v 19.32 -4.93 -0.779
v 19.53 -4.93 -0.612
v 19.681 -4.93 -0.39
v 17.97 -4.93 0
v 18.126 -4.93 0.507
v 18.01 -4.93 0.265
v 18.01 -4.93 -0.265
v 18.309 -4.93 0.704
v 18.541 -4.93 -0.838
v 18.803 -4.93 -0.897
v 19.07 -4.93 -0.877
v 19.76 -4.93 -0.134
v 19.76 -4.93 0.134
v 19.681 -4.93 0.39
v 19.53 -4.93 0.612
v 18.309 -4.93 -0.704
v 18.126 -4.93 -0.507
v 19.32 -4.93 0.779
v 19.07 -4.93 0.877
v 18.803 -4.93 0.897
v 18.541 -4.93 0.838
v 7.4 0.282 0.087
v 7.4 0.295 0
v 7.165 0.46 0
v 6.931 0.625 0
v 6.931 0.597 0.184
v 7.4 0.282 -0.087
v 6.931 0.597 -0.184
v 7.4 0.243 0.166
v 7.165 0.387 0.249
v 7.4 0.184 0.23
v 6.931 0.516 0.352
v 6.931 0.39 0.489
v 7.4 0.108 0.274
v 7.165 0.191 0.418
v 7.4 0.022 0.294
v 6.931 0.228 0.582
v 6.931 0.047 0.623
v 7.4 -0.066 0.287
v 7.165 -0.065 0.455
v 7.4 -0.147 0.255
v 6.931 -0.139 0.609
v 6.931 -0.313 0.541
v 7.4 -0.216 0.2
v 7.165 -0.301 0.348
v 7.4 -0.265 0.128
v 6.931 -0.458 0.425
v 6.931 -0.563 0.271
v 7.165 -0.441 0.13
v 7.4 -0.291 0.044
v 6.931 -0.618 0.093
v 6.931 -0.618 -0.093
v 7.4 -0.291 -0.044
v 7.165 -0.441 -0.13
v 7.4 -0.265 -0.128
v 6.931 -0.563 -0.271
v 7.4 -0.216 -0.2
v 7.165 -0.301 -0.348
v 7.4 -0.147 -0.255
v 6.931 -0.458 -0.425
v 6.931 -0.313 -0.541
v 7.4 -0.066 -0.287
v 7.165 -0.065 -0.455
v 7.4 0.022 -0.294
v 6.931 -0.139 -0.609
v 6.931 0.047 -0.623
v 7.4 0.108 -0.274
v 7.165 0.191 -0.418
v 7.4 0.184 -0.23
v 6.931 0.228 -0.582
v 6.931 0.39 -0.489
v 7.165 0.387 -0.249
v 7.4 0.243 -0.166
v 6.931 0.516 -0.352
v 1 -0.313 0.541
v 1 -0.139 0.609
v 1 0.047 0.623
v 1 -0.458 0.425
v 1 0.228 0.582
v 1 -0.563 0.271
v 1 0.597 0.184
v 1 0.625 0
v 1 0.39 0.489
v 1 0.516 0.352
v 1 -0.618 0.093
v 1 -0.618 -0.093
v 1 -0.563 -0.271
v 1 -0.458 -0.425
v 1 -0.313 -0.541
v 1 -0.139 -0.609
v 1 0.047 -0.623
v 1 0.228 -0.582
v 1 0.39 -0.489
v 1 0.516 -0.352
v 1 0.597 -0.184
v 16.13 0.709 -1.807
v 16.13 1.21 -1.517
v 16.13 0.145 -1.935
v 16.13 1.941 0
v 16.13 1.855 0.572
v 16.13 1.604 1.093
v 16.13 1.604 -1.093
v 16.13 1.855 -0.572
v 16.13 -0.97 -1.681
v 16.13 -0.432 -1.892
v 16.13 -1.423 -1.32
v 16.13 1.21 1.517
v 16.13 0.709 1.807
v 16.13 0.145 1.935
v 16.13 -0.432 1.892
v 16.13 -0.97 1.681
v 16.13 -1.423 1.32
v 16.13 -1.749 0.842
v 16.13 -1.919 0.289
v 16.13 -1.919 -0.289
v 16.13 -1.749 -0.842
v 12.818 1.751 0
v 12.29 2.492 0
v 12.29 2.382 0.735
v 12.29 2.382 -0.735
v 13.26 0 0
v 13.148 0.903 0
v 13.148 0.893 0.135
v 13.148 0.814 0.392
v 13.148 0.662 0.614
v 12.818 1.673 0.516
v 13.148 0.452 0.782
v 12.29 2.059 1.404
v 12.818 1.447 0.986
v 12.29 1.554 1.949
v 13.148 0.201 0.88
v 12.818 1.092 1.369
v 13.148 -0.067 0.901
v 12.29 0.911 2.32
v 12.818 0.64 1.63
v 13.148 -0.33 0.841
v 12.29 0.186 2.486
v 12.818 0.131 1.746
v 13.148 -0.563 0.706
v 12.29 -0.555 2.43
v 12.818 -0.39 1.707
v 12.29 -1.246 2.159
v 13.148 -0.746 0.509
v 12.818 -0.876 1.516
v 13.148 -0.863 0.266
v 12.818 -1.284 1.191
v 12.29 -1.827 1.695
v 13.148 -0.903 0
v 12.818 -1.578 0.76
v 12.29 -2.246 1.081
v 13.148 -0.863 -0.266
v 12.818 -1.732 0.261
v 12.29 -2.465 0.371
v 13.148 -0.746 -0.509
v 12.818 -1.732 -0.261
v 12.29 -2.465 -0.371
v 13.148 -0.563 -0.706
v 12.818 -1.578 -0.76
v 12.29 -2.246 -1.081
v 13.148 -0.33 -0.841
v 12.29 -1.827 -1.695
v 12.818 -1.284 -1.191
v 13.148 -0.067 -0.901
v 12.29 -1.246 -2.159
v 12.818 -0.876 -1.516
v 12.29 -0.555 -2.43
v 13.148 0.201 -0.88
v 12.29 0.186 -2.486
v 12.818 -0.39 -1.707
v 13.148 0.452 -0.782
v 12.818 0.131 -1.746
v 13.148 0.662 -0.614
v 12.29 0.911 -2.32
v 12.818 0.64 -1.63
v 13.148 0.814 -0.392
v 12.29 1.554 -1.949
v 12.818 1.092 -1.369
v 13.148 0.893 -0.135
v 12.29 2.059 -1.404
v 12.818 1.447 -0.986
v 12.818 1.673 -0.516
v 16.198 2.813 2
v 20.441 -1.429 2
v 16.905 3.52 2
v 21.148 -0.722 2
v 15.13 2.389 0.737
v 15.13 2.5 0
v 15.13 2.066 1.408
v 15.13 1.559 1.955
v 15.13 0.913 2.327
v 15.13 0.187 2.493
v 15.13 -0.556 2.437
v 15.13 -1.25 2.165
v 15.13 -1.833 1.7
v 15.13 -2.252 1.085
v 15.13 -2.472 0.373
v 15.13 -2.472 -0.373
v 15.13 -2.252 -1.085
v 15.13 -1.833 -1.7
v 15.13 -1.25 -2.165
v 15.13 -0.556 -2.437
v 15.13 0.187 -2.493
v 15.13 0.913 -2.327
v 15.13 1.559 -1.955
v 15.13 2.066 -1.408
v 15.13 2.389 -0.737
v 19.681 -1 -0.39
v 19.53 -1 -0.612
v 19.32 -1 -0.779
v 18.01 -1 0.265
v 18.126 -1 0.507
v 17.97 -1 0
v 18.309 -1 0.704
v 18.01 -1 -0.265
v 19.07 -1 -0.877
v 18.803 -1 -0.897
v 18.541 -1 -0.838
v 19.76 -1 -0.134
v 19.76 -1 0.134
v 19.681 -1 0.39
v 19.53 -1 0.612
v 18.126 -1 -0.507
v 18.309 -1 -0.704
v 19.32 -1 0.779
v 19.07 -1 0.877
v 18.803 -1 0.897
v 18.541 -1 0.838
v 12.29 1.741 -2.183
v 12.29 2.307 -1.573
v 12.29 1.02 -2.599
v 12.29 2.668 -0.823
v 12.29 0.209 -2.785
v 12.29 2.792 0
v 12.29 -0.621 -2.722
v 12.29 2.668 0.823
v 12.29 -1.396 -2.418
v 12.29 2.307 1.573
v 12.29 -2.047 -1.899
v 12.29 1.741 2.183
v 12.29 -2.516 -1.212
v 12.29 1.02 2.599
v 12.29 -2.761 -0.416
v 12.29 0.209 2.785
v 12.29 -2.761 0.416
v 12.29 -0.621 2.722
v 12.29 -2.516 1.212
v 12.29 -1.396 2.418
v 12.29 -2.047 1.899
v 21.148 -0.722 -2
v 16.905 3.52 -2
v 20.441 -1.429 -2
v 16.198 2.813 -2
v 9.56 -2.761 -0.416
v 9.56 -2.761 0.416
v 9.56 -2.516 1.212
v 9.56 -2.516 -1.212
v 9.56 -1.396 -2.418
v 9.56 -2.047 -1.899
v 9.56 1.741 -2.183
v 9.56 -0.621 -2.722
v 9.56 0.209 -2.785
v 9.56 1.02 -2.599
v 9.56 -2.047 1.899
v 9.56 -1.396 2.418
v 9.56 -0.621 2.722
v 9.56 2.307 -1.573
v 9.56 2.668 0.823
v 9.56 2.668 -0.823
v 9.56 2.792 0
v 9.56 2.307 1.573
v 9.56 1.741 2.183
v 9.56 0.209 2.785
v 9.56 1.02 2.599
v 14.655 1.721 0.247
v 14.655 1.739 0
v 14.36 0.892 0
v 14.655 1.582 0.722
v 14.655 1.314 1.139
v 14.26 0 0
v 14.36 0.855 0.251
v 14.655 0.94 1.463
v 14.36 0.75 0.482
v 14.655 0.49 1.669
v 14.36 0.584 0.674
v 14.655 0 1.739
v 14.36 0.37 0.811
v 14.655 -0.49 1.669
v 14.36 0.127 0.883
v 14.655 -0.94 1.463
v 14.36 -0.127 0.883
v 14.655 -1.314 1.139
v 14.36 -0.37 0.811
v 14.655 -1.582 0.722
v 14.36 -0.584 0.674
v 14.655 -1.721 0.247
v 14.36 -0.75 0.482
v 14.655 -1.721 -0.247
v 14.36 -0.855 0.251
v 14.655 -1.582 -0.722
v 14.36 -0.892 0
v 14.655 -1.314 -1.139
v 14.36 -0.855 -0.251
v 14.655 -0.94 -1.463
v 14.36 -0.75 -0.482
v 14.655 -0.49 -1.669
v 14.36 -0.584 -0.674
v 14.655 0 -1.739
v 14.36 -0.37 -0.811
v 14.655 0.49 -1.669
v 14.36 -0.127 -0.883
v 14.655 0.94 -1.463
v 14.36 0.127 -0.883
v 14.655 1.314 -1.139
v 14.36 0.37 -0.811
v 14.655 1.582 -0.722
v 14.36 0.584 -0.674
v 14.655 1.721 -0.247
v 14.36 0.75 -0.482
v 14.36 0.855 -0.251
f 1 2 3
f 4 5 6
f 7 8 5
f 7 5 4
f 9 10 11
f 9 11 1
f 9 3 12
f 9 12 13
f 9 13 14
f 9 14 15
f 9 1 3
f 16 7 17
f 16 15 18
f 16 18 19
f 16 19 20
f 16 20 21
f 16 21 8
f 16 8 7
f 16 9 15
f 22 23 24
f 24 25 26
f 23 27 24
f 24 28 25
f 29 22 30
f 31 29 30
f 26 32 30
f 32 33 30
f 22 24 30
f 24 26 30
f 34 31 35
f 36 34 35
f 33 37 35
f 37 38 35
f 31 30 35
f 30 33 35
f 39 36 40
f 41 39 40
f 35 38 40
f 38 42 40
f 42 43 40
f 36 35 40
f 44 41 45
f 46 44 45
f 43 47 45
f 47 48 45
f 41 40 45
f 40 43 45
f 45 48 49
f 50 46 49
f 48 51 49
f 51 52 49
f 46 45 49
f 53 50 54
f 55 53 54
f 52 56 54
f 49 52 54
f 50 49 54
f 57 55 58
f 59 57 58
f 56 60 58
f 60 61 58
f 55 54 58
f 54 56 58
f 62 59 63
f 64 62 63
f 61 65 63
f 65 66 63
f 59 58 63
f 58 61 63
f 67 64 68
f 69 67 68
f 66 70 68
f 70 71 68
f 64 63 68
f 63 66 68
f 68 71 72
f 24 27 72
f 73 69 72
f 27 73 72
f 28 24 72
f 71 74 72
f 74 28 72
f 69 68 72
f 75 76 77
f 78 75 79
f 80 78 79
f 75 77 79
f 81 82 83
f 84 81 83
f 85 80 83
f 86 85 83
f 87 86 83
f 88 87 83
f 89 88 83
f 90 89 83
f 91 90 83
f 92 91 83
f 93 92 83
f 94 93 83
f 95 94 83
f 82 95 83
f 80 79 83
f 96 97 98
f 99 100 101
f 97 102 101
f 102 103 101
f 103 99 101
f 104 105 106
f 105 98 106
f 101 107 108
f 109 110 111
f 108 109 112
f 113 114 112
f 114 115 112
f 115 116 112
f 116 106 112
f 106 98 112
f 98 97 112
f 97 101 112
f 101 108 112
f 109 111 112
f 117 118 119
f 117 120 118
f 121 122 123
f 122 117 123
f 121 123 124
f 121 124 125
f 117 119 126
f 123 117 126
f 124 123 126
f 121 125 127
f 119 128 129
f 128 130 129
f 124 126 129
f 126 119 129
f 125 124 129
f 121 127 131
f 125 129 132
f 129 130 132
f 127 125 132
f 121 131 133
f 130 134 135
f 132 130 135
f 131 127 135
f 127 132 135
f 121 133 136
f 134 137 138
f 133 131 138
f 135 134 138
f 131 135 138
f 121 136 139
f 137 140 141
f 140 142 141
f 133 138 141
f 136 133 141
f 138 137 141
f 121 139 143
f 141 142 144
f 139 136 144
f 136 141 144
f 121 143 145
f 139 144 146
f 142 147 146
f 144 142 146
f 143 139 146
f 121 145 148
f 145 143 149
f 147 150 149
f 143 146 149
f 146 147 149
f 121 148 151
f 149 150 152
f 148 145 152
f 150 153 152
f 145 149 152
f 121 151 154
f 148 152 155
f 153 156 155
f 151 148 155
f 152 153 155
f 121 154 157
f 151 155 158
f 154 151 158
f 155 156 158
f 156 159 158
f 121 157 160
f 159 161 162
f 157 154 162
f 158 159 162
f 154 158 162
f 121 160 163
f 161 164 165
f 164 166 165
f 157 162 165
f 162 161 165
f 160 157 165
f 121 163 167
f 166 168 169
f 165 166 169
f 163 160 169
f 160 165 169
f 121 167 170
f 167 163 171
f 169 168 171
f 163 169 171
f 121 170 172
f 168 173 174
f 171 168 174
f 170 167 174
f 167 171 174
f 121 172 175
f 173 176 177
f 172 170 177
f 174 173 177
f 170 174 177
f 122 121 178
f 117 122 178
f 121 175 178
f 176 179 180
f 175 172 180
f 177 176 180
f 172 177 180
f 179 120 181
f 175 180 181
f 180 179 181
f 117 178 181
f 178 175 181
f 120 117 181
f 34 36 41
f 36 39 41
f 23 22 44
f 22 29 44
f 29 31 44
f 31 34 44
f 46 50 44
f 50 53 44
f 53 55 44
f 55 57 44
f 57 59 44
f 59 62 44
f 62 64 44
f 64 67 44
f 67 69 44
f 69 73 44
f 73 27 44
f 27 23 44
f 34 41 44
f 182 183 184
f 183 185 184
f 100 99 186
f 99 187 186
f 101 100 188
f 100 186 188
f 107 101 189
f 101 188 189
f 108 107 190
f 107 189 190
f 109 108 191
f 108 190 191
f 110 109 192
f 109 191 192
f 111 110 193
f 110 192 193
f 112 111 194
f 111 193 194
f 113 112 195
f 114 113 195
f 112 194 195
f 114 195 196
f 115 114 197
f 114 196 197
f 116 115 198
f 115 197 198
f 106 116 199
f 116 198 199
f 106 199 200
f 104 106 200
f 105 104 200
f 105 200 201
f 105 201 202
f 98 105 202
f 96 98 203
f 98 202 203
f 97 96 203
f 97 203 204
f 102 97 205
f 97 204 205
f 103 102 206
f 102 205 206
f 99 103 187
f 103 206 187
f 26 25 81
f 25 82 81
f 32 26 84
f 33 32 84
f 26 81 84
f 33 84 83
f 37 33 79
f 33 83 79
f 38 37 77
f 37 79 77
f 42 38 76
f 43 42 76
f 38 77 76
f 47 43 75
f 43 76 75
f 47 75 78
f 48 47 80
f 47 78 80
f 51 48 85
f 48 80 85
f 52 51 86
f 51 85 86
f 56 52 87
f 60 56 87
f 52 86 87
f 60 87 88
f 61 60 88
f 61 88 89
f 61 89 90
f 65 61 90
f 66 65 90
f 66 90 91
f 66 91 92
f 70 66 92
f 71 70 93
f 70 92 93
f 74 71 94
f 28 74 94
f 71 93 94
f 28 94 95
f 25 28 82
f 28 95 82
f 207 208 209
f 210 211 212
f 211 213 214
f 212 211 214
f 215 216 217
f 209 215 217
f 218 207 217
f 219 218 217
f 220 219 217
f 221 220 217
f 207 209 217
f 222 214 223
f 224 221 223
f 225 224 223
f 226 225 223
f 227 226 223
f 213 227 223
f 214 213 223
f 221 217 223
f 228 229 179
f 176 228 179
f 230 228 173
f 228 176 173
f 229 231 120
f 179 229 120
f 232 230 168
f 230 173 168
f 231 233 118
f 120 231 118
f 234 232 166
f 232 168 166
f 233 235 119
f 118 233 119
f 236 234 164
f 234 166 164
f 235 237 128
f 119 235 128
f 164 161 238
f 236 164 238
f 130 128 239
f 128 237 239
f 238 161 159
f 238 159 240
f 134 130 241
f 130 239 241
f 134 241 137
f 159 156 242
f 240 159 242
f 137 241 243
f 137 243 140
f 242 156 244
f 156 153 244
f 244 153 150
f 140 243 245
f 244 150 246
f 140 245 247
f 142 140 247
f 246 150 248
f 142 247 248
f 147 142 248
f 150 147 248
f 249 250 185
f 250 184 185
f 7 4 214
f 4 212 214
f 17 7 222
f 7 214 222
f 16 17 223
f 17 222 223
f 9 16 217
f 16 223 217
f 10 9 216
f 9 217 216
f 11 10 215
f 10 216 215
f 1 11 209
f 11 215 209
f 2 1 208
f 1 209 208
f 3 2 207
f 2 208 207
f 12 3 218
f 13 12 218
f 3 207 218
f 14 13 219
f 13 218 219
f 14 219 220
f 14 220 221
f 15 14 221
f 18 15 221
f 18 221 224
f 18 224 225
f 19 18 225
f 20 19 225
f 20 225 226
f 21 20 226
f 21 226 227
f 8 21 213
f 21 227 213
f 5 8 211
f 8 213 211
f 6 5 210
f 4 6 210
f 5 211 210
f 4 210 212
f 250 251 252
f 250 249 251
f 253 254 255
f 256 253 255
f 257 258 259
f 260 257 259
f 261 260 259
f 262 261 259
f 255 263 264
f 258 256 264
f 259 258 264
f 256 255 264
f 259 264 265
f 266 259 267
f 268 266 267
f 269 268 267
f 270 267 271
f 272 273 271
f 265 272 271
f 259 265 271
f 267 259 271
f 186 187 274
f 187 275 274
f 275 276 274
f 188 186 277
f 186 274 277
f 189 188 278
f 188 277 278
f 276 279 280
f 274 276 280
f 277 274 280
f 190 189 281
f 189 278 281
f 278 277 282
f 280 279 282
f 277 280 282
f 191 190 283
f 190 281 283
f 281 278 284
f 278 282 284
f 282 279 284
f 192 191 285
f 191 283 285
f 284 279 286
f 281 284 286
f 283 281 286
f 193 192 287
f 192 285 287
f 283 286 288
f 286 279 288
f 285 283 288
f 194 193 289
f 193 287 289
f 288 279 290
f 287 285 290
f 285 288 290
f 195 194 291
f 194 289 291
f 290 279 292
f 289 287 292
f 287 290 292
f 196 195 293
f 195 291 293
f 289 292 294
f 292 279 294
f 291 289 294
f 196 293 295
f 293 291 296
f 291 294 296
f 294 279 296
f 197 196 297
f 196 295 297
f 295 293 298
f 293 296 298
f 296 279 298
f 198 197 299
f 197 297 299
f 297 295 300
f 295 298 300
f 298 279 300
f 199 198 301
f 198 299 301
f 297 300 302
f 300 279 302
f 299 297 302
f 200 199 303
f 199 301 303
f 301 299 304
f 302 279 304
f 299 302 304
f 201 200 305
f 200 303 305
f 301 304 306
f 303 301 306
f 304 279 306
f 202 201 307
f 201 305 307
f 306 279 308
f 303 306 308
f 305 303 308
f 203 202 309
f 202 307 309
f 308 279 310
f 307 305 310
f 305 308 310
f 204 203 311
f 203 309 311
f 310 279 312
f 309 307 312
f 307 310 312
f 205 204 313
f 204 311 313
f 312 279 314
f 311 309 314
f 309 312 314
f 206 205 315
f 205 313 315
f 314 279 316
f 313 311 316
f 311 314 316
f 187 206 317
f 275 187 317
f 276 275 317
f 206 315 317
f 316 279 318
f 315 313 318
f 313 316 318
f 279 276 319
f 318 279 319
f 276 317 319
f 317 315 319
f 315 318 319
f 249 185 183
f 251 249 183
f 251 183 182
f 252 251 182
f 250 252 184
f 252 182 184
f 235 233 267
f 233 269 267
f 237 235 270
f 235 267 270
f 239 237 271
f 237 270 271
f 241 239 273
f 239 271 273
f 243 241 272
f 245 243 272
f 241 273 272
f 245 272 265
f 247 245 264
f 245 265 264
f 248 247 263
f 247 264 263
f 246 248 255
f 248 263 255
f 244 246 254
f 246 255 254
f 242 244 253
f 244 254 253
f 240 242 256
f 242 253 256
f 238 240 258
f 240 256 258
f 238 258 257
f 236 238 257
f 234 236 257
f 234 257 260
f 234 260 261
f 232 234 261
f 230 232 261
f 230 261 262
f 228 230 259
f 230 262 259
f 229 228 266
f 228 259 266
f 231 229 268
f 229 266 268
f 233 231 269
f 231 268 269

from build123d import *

# Parameters (mm, degrees)
BOSS_EXTRUDE1_DEPTH = 2
SKETCH1_7_W         = 0.9
SKETCH1_7_H         = 3.93


with BuildPart() as part:
    # Sketch1 → Boss-Extrude1 (new, symmetric)
    with BuildSketch(Plane.XY):
        Polygon((20.440710678, -1.429289322), (16.198069991, 2.813351365), (16.905176772, 3.520458146), (21.147817459, -0.722182541), align=None)
    extrude(amount=BOSS_EXTRUDE1_DEPTH, both=True)


with BuildPart() as body_2:
    # Sketch1<6> → Revolve4 (revolve)
    with BuildSketch(Plane.XY):
        with BuildLine():
            Line((16.13, 0), (16.13, 1.940845924))
            Line((16.13, 1.940845924), (15.13, 2.5))
            ThreePointArc((15.13, 2.5), (14.483714127, 1.323527484), (14.26, 0))
            Line((14.26, 0), (16.13, 0))
        make_face()
        with BuildLine():
            Line((12.29, 2.4925), (12.29, 2.7925))
            Line((12.29, 2.7925), (9.56, 2.7925))
            Line((9.56, 2.7925), (9.56, 0))
            Line((9.56, 0), (13.26, 0))
            ThreePointArc((13.26, 0), (13.00895401, 1.337297298), (12.29, 2.4925))
        make_face()
        Polygon((1, 0), (7.4, 0), (7.4, 0.29464991), (6.930638676, 0.625), (1, 0.625), align=None)
    revolve(axis=Axis((0, 0, 0), (1, 0, 0)))


with BuildPart() as body_3:
    # Sketch1<7> → Revolve5 (revolve)
    with BuildSketch(Plane.XY):
        with Locations((18.42, -2.965)):
            Rectangle(SKETCH1_7_W, SKETCH1_7_H)
    revolve(axis=Axis((18.87, -1, 0), (0, -1, 0)))


solid = Compound([part.part, body_2.part, body_3.part])
